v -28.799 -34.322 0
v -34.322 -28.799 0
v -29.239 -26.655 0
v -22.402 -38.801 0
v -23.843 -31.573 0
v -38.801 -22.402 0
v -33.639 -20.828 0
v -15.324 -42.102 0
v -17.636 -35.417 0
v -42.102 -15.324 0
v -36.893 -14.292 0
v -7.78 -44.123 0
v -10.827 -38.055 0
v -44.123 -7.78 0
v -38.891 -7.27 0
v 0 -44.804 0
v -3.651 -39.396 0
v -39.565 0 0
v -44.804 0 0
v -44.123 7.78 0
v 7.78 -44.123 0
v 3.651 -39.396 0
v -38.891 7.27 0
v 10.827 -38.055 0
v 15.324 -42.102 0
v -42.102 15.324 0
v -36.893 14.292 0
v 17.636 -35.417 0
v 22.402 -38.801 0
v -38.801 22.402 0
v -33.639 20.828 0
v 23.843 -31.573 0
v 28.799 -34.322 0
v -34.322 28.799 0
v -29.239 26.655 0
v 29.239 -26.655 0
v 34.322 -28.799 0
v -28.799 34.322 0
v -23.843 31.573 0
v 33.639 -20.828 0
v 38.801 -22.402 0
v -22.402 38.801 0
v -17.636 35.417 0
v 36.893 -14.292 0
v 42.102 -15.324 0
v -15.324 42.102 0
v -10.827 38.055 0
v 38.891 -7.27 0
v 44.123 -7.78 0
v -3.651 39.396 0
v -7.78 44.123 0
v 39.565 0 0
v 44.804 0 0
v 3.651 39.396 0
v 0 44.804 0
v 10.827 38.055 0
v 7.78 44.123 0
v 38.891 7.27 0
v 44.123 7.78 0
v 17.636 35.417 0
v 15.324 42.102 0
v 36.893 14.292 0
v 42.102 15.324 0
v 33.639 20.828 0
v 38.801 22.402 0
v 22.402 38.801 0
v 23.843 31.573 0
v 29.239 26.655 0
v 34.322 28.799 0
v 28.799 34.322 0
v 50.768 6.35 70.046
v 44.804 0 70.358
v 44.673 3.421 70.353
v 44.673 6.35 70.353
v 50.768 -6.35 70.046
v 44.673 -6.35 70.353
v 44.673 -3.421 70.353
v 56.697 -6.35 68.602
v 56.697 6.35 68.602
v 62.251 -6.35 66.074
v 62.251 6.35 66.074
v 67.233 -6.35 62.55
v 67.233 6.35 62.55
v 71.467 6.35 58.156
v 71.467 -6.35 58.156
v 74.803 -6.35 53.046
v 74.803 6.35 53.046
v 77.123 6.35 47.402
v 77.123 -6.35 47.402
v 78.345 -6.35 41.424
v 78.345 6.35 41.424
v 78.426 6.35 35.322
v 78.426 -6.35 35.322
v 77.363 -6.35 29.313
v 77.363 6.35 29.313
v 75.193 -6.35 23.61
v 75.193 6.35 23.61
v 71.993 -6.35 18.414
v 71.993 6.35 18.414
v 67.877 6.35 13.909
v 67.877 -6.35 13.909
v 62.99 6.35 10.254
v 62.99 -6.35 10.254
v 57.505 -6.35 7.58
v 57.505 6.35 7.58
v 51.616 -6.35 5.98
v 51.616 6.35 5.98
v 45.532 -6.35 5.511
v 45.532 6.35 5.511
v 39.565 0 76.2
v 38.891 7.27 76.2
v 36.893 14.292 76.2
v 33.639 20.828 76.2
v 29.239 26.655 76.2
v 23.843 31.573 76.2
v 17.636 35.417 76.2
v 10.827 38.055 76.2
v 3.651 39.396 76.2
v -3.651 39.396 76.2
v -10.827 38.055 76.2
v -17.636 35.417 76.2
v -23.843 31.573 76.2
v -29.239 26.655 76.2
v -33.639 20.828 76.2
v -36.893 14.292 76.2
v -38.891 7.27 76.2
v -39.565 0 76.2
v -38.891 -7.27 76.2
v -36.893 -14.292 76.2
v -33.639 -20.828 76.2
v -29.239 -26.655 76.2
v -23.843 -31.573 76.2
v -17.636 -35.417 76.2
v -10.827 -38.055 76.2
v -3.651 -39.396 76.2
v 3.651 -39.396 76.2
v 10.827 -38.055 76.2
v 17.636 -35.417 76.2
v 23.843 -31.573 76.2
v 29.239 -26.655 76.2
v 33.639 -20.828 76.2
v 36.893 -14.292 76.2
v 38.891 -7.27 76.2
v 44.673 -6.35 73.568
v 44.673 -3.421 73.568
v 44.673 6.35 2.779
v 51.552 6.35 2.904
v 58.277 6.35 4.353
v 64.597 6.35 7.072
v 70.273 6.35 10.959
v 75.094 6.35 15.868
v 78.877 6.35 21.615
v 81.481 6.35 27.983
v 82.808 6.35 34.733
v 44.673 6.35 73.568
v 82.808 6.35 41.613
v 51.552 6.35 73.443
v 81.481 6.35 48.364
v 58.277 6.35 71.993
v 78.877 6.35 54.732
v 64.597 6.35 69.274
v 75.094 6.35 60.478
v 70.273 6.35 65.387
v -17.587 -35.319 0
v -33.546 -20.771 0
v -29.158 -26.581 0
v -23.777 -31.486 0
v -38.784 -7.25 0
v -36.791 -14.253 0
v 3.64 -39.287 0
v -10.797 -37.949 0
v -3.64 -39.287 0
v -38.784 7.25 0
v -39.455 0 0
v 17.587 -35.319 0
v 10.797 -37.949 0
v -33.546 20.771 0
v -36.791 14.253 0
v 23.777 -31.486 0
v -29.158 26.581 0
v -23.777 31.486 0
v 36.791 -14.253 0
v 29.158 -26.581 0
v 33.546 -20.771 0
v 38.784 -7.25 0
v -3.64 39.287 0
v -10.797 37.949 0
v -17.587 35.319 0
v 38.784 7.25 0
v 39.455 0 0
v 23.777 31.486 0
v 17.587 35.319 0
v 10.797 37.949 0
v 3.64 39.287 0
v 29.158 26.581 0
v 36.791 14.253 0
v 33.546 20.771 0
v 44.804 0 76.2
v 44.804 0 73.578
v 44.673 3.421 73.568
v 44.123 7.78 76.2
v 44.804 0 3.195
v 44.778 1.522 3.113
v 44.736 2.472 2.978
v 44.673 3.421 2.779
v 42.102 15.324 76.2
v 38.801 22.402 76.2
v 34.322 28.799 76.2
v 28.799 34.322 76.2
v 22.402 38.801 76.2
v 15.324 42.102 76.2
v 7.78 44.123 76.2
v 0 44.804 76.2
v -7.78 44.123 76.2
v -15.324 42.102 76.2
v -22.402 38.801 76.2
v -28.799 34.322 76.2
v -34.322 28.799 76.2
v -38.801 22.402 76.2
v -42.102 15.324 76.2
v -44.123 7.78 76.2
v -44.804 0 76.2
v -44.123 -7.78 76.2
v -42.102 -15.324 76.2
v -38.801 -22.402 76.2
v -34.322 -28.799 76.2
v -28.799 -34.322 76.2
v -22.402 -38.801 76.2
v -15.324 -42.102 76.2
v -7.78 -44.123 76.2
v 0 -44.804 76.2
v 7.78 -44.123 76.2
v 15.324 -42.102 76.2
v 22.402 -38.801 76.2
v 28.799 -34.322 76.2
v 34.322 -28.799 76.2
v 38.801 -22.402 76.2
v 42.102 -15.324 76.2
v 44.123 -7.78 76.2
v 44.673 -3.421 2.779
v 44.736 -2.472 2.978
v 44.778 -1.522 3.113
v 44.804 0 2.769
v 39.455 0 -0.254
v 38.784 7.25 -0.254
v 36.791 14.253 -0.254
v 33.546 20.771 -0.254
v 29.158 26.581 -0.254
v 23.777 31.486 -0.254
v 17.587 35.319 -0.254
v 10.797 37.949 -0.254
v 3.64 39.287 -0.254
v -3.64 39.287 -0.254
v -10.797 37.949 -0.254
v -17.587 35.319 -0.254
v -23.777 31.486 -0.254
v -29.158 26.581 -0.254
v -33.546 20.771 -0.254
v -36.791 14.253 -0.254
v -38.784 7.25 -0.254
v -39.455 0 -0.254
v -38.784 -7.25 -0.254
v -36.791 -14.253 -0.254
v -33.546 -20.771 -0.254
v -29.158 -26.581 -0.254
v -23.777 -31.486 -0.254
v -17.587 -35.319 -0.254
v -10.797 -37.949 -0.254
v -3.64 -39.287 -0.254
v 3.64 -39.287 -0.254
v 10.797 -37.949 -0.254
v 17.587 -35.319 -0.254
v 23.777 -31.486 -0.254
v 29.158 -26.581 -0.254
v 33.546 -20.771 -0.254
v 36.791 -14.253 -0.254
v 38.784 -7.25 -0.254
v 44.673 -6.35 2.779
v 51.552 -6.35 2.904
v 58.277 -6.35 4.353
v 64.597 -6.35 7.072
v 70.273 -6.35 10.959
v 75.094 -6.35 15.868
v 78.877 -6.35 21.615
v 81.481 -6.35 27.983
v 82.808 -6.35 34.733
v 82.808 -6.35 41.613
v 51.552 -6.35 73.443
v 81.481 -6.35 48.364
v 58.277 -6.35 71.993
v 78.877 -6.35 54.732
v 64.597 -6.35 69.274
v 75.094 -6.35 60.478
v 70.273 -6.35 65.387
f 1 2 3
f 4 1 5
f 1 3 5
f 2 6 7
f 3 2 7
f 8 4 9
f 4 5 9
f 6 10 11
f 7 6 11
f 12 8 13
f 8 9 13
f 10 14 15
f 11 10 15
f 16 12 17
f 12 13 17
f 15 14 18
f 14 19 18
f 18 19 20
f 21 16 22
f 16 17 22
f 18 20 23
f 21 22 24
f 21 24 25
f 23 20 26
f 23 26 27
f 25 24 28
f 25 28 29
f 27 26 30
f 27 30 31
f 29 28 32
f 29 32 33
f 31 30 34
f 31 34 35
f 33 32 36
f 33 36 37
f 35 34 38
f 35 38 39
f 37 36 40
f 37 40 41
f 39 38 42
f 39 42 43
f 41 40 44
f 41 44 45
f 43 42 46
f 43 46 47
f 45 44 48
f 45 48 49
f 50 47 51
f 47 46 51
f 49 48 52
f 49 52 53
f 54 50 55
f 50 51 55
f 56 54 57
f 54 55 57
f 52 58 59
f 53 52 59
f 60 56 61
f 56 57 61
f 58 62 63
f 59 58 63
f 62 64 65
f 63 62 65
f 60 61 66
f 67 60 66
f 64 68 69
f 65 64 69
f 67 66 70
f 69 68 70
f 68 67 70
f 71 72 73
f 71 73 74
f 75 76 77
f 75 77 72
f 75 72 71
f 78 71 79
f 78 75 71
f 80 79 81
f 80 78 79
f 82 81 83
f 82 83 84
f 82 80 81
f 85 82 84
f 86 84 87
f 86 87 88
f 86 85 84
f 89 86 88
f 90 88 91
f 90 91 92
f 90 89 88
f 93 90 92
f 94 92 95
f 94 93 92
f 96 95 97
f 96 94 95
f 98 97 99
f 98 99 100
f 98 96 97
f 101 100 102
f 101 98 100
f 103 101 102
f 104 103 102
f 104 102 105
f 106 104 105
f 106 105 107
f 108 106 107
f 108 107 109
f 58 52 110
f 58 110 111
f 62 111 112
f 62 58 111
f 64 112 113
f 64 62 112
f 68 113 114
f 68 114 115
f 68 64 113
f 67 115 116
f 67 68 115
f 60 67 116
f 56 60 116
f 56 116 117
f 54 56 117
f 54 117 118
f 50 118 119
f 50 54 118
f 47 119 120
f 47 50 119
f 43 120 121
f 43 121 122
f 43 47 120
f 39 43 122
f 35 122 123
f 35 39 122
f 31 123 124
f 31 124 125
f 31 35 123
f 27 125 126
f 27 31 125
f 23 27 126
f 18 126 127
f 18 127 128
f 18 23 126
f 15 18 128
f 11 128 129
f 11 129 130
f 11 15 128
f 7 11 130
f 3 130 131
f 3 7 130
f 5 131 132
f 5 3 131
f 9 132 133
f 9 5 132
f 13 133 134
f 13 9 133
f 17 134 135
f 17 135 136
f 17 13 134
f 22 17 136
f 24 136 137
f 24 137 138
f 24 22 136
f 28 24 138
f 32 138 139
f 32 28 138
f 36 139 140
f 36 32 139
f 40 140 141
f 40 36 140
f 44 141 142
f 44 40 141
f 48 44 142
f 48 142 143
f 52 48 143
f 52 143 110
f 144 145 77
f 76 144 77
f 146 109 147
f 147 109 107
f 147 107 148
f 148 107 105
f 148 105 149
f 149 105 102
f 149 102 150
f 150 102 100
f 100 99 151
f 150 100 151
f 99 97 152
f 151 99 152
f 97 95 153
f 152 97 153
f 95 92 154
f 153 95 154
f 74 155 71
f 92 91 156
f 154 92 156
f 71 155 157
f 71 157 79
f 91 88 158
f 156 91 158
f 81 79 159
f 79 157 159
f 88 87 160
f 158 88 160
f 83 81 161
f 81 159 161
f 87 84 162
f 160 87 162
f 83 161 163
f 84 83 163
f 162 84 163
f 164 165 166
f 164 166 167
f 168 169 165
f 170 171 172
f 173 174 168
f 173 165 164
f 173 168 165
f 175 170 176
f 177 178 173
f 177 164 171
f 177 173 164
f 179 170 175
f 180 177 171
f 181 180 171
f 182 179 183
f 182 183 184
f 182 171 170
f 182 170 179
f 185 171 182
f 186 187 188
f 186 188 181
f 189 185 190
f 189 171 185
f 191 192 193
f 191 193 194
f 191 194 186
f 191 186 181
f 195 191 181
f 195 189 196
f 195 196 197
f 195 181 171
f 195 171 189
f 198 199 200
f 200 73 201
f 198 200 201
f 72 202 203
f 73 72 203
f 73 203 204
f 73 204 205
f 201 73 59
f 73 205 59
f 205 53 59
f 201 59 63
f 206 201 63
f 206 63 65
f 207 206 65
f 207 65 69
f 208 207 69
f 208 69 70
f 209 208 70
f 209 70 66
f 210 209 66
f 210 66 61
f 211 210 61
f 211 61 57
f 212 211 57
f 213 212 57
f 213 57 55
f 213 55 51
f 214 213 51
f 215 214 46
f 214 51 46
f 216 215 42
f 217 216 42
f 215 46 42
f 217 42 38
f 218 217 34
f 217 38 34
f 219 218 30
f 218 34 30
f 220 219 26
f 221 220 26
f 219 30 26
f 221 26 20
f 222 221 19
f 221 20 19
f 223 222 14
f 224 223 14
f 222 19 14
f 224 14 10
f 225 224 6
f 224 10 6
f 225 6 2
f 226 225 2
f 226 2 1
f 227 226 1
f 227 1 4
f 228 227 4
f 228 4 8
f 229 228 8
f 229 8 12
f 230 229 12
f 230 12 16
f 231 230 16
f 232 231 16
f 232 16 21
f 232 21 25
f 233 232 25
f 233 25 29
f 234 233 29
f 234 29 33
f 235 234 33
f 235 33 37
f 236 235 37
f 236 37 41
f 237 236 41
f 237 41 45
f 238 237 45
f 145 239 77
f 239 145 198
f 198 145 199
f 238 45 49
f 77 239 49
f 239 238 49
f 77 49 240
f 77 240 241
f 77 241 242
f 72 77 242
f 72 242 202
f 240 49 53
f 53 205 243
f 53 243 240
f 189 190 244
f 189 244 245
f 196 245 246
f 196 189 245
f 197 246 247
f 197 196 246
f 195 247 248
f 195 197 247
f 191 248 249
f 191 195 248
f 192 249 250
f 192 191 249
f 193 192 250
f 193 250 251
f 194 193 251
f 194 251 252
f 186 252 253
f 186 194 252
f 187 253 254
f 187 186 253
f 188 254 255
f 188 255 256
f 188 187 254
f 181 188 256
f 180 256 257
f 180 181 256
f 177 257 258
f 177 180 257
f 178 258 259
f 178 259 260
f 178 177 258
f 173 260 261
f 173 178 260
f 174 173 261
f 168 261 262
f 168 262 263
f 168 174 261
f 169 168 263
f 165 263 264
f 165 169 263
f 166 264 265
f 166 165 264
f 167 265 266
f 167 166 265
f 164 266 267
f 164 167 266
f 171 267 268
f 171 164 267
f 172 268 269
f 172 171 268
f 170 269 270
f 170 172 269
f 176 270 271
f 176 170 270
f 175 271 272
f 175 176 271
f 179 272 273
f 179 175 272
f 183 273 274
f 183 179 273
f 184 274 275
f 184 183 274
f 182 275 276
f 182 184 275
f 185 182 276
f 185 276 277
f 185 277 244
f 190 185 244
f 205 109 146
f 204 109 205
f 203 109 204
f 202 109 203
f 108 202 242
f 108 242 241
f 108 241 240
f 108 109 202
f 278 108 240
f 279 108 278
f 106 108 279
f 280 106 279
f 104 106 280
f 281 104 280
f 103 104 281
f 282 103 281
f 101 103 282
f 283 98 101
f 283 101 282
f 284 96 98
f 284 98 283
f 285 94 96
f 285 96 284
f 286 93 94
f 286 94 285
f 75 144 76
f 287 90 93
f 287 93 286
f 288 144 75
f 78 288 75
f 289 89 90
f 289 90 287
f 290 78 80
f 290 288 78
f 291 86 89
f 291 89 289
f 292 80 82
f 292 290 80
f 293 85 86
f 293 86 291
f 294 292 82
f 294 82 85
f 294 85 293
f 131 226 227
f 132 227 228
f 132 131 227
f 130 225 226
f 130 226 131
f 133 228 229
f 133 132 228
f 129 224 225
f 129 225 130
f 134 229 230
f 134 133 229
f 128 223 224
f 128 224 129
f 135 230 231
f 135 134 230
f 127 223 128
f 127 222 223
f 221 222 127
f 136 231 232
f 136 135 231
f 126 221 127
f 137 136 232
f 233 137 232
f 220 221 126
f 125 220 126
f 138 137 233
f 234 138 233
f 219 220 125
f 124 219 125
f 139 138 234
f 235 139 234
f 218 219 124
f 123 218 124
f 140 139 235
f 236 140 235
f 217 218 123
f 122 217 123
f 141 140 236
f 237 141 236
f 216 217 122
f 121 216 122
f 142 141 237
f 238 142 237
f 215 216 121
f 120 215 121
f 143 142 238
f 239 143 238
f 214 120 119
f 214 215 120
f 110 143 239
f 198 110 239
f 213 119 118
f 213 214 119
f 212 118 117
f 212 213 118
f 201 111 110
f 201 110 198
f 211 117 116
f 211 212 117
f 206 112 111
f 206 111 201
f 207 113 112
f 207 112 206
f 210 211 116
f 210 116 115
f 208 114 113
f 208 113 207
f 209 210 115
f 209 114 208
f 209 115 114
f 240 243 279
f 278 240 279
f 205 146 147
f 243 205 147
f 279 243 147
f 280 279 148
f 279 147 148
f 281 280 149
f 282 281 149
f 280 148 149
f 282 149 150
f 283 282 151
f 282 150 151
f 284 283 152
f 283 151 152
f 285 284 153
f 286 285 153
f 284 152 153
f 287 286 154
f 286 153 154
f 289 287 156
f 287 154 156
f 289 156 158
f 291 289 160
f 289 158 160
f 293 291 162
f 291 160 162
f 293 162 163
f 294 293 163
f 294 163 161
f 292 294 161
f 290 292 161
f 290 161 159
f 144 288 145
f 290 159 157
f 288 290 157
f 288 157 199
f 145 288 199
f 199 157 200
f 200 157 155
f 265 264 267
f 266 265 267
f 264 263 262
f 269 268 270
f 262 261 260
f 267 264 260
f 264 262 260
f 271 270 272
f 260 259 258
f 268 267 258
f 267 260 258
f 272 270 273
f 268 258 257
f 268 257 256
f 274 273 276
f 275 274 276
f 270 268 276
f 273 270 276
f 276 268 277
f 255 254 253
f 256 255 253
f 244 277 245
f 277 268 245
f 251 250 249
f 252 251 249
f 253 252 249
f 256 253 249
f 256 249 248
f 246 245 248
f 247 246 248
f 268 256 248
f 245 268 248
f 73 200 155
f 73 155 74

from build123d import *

# Parameters (mm, degrees)
F0_R          = 44.803850357
F0_R_2        = 39.5649031507
F1_DEPTH      = 76.2
F0_R_3        = 39.4553703488
F2_DEPTH      = 0.254
F4_DEPTH      = 6.35
F4_DEPTH_BACK = 6.35


# Not quite as in the source:
# - the program builds the solid bodies; features that only make, move or delete a surface that nothing else refers to are left out


with BuildPart() as f1:
    # F0 (on Top) → F1 (new body)
    with BuildSketch(Plane.XY):
        Circle(F0_R)
        Circle(F0_R_2, mode=Mode.SUBTRACT)
    extrude(amount=F1_DEPTH)

    # F3 (on Front) → F4 (join, two sides)
    with BuildSketch(Plane.XZ) as f4_sk:
        with BuildLine():
            ThreePointArc((44.6730293334, 70.3529790044), (78.5293989005, 38.3747792802), (45.5318614841, 5.5110980757))
            Line((45.5318614841, 5.5110980757), (44.6730293334, 2.7786104474))
            ThreePointArc((44.6730293334, 2.7786104474), (82.974605628, 38.1732090609), (44.6730293334, 73.5678076744))
            Line((44.6730293334, 73.5678076744), (44.6730293334, 70.3529790044))
        make_face()
    extrude(amount=F4_DEPTH)
    extrude(f4_sk.sketch, amount=-F4_DEPTH_BACK)


with BuildPart() as f2:
    # F0 (on Top) → F2 (new body)
    with BuildSketch(Plane.XY):
        Circle(F0_R_3)
    extrude(amount=-F2_DEPTH)


solid = Compound([f1.part, f2.part])
